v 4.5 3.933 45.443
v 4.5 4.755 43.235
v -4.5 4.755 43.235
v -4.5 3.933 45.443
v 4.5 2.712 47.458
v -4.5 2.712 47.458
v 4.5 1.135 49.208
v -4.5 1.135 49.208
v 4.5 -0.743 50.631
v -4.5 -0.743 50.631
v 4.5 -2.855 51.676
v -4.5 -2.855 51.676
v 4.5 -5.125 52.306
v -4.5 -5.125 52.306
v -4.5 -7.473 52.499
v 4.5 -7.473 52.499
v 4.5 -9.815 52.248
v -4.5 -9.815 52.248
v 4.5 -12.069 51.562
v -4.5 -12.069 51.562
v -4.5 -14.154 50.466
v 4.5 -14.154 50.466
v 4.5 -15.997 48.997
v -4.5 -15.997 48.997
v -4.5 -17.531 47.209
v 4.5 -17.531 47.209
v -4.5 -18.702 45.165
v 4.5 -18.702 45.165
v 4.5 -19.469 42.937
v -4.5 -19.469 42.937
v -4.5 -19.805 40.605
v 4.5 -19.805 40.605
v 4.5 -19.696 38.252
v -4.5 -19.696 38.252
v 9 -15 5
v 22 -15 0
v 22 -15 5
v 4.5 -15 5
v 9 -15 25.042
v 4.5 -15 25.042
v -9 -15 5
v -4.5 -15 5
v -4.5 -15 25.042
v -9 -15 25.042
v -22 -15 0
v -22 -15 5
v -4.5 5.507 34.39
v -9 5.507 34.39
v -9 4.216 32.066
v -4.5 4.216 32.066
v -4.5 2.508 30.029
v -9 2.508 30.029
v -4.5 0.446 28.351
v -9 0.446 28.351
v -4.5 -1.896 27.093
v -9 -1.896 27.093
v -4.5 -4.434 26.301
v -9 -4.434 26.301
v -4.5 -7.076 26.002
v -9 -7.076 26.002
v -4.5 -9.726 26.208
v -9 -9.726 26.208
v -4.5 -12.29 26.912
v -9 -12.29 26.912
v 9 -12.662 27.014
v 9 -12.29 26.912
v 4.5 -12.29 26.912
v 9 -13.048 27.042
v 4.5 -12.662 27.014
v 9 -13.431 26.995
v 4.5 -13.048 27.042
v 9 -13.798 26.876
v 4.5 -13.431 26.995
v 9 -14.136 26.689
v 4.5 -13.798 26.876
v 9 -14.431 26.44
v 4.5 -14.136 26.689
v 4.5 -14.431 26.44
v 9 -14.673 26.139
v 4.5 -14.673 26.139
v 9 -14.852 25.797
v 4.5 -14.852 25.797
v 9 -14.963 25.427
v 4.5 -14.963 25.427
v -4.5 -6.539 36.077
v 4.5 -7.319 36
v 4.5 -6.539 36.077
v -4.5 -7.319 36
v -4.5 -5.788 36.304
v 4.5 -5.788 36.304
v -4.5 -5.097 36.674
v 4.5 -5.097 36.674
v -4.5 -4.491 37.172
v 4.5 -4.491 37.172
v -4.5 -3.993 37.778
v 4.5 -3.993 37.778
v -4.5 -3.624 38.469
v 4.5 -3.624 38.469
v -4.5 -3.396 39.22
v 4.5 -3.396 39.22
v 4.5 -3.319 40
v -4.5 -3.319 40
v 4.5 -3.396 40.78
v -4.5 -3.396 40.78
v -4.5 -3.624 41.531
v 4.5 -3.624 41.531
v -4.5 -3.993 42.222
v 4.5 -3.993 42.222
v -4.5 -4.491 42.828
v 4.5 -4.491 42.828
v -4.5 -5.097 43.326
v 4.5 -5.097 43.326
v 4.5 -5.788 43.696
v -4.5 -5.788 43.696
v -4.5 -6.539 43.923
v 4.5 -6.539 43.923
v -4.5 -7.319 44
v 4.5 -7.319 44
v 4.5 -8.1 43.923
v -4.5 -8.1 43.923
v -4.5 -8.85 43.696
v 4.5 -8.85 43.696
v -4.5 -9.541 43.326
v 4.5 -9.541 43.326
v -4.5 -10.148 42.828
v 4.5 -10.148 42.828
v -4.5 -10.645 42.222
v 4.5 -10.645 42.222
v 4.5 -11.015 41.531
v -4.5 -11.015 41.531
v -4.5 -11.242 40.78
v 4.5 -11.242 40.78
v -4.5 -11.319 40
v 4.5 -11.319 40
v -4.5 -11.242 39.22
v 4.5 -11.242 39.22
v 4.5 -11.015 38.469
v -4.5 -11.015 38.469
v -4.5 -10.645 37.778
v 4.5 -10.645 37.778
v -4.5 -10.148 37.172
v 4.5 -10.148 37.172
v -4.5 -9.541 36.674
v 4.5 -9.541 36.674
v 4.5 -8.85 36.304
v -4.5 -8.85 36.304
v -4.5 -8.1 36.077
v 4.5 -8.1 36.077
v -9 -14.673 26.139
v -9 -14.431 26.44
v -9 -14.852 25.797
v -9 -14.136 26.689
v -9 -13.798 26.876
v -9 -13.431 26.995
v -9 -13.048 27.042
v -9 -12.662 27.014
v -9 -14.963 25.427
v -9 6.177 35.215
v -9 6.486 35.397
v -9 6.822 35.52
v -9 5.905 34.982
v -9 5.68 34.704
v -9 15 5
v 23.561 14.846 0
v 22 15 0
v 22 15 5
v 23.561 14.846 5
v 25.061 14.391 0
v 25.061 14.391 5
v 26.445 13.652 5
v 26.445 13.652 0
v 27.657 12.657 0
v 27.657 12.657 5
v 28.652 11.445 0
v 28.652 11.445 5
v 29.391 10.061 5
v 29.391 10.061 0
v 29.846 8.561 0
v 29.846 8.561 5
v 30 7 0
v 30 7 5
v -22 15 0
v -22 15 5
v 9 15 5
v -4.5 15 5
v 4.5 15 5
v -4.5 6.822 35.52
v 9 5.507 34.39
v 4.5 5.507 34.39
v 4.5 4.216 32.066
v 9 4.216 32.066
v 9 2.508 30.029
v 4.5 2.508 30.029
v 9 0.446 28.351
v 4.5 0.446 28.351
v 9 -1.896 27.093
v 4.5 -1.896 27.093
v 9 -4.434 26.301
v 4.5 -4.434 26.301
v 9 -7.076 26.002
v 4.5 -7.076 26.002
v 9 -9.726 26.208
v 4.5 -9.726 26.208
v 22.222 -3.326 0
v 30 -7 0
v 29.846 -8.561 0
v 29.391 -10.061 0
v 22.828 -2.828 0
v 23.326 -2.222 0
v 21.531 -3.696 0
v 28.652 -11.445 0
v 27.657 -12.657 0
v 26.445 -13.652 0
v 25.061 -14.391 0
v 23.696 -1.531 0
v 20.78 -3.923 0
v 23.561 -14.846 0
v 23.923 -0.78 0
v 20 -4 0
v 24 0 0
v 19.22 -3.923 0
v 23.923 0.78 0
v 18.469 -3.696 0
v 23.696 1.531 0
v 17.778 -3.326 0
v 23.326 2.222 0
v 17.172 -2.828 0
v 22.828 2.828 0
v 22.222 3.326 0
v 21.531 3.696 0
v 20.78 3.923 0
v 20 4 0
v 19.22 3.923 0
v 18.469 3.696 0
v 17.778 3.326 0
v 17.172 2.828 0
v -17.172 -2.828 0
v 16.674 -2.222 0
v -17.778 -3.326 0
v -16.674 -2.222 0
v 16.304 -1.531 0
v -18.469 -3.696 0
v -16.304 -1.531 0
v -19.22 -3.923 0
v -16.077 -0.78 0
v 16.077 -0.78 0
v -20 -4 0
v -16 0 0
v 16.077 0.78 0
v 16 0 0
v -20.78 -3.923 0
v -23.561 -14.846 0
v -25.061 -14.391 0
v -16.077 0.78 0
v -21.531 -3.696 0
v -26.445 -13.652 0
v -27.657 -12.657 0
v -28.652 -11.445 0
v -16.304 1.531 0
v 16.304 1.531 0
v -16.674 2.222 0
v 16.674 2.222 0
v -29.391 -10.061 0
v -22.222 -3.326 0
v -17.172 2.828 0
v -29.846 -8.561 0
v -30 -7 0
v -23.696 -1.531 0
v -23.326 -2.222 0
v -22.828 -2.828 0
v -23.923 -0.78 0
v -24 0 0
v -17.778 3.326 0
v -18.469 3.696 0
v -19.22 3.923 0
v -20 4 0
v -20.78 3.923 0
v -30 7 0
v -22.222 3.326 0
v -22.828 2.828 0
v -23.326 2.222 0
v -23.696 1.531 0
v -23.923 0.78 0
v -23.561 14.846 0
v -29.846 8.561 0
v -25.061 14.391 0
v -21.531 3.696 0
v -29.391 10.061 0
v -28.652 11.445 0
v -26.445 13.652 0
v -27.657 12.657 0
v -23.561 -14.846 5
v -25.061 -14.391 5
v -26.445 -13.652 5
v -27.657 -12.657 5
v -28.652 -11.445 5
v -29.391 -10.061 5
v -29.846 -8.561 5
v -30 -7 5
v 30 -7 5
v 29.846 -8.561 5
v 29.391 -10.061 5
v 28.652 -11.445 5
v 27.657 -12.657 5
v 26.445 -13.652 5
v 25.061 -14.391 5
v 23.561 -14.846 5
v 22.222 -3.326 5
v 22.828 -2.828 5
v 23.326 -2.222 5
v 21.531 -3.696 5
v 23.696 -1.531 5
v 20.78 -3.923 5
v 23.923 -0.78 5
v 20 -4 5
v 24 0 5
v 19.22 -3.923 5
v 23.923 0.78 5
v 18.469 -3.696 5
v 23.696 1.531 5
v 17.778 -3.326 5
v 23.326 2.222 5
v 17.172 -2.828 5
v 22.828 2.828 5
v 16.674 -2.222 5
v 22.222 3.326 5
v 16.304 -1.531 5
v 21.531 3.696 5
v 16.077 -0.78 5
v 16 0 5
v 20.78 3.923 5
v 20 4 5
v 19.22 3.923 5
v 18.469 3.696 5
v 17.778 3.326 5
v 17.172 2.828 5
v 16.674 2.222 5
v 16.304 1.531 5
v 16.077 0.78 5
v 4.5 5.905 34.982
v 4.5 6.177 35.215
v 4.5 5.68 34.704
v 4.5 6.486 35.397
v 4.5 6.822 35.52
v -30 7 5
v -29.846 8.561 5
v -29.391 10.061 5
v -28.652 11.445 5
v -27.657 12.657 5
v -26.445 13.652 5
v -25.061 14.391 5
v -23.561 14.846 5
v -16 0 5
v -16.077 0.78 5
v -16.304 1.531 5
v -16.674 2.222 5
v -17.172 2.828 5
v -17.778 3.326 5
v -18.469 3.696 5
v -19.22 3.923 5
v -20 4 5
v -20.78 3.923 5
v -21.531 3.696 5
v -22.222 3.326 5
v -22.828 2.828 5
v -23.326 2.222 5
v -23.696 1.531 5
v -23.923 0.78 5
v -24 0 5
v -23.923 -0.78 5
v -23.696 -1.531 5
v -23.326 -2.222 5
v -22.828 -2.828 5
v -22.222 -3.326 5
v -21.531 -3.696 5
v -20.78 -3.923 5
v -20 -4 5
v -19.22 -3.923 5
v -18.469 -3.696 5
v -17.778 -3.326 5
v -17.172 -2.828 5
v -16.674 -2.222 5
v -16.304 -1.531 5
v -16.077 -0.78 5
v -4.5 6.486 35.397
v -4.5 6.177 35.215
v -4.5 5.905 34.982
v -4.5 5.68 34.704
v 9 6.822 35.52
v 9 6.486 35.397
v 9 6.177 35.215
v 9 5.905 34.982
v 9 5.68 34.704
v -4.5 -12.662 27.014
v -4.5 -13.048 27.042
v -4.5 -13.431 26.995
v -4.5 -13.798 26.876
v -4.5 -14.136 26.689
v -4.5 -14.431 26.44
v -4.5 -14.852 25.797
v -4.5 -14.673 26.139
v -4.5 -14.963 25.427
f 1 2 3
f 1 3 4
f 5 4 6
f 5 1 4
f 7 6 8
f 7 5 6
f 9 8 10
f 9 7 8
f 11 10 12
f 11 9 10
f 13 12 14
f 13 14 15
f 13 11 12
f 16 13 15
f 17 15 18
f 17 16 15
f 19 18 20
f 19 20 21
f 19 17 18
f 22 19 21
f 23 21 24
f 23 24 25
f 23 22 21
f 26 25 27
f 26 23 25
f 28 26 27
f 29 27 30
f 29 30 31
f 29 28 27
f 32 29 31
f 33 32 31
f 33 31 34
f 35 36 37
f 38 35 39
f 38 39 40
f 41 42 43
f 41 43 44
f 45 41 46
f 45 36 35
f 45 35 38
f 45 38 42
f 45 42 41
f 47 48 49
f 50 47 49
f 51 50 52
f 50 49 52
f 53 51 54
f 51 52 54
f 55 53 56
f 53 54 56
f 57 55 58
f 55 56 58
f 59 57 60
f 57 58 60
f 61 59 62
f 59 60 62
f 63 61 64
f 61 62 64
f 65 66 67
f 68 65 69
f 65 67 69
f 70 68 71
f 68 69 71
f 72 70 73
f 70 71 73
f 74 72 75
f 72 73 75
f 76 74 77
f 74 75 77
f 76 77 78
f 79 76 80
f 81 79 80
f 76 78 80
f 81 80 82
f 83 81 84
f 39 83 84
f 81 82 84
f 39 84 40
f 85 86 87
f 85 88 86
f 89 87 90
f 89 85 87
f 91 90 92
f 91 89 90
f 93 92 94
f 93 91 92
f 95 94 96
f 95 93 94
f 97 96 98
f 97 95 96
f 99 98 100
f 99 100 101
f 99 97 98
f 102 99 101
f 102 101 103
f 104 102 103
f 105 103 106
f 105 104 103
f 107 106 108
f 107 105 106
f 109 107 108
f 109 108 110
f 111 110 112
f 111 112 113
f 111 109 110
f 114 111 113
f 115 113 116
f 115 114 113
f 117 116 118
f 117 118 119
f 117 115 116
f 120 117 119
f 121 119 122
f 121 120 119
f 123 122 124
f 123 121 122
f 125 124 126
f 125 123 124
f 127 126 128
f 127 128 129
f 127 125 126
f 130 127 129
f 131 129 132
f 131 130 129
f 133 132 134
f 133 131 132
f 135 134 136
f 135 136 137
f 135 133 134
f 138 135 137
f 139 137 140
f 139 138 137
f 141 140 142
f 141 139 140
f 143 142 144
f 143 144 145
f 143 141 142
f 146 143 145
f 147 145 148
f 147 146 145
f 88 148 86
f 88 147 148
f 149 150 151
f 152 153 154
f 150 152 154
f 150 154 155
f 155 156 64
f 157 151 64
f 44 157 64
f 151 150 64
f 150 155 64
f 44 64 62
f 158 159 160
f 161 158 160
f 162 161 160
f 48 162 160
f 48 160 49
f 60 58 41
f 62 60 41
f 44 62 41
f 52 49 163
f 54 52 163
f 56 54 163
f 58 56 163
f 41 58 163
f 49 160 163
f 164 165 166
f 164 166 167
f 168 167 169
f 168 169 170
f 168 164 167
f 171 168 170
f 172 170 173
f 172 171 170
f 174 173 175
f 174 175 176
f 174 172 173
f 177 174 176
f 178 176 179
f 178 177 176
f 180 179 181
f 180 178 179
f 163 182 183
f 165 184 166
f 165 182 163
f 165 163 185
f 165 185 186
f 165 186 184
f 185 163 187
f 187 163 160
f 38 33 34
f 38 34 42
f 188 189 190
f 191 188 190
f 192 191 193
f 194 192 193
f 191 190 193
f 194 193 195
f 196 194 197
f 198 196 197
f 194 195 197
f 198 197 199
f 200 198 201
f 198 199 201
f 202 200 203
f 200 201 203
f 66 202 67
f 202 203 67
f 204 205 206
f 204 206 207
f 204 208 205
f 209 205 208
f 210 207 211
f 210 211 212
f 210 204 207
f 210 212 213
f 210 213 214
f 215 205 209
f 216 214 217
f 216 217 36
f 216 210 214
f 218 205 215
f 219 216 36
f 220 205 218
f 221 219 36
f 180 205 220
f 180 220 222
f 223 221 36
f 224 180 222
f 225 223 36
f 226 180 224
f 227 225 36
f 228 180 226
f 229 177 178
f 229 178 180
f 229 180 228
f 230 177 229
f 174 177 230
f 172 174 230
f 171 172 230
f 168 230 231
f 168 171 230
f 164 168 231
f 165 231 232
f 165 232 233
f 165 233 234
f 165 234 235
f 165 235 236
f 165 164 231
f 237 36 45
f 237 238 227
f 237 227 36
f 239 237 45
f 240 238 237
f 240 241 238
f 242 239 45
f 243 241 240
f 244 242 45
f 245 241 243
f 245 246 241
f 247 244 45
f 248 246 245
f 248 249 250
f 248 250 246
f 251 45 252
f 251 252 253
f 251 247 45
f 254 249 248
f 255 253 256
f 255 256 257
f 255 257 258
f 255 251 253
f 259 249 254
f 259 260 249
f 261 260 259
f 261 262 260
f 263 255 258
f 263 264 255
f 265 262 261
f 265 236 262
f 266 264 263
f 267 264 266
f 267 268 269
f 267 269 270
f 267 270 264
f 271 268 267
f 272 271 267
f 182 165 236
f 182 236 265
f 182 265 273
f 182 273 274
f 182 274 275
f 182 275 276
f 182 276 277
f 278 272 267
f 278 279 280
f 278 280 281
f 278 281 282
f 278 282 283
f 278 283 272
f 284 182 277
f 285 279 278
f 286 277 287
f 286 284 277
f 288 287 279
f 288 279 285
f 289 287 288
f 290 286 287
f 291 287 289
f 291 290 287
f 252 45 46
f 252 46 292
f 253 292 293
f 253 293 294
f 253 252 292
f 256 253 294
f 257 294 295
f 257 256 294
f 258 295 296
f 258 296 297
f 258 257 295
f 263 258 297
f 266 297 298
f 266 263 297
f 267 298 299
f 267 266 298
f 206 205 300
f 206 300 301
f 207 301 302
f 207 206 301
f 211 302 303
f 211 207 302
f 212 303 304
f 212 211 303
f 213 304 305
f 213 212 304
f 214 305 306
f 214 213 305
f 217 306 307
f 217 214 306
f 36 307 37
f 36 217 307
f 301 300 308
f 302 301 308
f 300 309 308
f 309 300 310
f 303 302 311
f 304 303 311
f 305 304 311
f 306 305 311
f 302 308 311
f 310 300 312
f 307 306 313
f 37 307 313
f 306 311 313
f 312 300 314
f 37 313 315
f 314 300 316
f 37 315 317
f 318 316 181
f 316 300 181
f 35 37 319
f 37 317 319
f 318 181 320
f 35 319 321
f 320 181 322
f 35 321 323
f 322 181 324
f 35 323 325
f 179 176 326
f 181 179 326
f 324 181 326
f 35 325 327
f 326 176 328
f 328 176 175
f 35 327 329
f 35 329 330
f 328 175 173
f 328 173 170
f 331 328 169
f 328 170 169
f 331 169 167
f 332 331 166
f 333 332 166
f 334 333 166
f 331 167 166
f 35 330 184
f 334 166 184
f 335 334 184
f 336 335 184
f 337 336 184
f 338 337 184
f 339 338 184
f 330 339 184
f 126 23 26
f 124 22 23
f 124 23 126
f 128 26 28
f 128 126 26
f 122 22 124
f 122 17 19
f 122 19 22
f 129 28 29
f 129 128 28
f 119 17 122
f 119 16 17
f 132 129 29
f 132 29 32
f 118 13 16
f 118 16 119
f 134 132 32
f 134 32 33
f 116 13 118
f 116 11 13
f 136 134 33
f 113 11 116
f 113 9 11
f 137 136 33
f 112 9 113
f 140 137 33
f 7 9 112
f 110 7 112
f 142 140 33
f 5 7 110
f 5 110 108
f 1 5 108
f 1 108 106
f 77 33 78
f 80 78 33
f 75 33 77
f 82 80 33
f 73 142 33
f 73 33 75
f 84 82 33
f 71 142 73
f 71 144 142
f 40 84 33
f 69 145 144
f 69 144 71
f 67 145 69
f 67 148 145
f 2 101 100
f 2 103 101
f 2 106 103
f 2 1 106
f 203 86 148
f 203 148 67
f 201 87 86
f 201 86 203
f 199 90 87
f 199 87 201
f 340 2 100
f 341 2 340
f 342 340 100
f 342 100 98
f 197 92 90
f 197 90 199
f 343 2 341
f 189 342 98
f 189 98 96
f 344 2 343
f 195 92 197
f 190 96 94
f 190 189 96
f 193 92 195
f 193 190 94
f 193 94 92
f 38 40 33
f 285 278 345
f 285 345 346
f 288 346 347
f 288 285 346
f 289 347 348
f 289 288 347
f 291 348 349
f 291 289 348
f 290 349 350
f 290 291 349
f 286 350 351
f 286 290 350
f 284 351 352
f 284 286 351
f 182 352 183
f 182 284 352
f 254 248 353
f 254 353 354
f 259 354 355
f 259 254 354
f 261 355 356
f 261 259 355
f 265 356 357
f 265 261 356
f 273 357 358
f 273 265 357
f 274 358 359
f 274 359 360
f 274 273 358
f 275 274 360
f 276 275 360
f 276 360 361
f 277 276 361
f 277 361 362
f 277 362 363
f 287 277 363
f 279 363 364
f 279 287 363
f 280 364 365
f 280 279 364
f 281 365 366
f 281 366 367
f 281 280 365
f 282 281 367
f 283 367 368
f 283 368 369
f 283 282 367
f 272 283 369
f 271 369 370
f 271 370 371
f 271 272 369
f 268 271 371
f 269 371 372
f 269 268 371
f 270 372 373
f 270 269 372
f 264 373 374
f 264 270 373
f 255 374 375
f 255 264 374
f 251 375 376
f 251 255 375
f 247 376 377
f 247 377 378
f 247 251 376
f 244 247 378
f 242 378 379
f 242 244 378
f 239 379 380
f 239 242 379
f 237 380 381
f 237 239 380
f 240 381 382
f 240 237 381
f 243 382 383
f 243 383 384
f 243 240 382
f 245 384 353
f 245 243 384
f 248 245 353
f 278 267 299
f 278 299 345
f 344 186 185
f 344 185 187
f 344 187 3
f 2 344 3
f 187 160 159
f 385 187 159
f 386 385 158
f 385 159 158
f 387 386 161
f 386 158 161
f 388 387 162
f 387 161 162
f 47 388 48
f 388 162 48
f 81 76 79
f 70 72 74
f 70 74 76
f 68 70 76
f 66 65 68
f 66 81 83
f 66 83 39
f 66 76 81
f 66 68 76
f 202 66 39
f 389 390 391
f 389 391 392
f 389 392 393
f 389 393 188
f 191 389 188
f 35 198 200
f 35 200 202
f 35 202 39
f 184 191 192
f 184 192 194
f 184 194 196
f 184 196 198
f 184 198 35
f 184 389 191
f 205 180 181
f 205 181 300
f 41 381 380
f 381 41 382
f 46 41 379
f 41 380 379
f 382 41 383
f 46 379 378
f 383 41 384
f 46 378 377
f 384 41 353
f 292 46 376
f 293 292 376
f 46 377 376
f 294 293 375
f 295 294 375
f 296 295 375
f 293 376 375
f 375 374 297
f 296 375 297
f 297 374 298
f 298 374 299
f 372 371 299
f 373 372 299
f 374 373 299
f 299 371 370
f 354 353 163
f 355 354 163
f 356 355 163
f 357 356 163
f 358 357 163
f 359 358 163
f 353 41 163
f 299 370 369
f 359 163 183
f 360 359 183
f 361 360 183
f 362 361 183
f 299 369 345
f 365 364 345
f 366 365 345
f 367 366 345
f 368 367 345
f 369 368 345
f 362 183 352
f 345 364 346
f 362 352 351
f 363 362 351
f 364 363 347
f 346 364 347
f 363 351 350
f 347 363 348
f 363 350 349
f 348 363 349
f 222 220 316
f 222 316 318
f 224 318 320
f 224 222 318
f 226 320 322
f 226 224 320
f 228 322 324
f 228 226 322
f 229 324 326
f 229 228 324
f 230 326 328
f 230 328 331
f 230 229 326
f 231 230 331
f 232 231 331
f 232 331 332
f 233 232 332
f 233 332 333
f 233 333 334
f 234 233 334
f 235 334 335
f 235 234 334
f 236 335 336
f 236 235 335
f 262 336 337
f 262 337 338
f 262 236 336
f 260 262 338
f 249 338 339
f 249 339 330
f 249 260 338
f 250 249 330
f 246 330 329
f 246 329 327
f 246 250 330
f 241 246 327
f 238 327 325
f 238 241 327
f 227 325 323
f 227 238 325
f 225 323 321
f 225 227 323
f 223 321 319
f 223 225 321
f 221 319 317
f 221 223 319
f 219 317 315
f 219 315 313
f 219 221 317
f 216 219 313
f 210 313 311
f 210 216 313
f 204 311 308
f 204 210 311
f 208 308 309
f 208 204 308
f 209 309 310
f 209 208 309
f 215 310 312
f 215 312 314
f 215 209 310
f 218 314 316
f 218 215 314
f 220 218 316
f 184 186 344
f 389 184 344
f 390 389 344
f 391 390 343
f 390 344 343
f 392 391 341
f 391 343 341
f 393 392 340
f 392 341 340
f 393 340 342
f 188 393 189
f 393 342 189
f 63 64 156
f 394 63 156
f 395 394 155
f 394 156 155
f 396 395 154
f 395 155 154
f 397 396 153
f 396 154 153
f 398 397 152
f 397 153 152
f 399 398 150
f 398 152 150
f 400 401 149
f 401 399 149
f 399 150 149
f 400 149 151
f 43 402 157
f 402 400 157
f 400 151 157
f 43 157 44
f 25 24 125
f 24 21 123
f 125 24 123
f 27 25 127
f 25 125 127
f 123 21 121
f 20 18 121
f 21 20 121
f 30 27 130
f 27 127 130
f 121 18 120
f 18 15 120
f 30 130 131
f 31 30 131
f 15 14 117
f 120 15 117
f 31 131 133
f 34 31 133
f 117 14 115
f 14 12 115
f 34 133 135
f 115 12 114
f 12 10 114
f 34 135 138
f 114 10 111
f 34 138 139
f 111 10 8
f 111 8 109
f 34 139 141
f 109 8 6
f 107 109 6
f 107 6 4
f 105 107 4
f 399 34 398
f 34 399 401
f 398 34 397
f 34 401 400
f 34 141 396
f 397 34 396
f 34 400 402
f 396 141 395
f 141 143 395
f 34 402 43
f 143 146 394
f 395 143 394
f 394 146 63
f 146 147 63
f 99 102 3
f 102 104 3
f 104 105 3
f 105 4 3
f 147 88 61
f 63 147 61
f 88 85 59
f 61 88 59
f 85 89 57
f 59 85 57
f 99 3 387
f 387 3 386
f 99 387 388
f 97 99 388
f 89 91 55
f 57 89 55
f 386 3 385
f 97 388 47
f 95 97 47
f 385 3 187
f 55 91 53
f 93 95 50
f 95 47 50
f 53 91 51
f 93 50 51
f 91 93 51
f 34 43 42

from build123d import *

# Parameters (mm, degrees)
SZKIC1_R                         = 4
DODANIE_WYCI_GNI_CIE1_DEPTH      = 5
SZKIC7_R                         = 4
DODANIE_WYCI_GNI_CIE3_DEPTH      = 4.5
DODANIE_WYCI_GNI_CIE5_DEPTH      = 4.5
DODANIE_WYCI_GNI_CIE5_DEPTH_BACK = 13.5


with BuildPart() as part:
    # Szkic1 → Dodanie-wyciągnięcie1 (new body)
    with BuildSketch(Plane.XY):
        with BuildLine():
            Line((-22, 15), (22, 15))
            ThreePointArc((22, 15), (27.656854249, 12.656854249), (30, 7))
            Line((30, 7), (30, -7))
            ThreePointArc((30, -7), (27.656854249, -12.656854249), (22, -15))
            Line((22, -15), (-22, -15))
            ThreePointArc((-22, -15), (-27.656854249, -12.656854249), (-30, -7))
            Line((-30, -7), (-30, 7))
            ThreePointArc((-30, 7), (-27.656854249, 12.656854249), (-22, 15))
        make_face()
        with Locations((-20, 0)):
            Circle(SZKIC1_R, mode=Mode.SUBTRACT)
        with Locations((20, 0)):
            Circle(SZKIC1_R, mode=Mode.SUBTRACT)
    extrude(amount=DODANIE_WYCI_GNI_CIE1_DEPTH)

    # Szkic7 → Dodanie-wyciągnięcie3 (add, symmetric)
    with BuildSketch(Plane(origin=(0, 0, 0), x_dir=(0, 0, -1), z_dir=(1, 0, 0))):
        with BuildLine():
            Line((-5, 15), (-43.235238064, 4.754898838))
            ThreePointArc((-43.235238064, 4.754898838), (-52.248209815, -9.815442471), (-38.251909732, -19.696337656))
            Line((-38.251909732, -19.696337656), (-5, -15))
            Line((-5, -15), (-5, 15))
        make_face()
        with Locations((-40, -7.31917399)):
            Circle(SZKIC7_R, mode=Mode.SUBTRACT)
    extrude(amount=DODANIE_WYCI_GNI_CIE3_DEPTH, both=True)

    # Szkic8 → Dodanie-wyciągnięcie5 (add, two sides: drawn at the far end of the back side and taken through both)
    with BuildSketch(Plane(origin=(4.5, 0, 0), x_dir=(0, 0, -1), z_dir=(1, 0, 0)).offset(-DODANIE_WYCI_GNI_CIE5_DEPTH_BACK)):
        with BuildLine():
            Line((-5, -15), (-5, 15))
            Line((-5, 15), (-35.519913082, 6.822213937))
            ThreePointArc((-35.519913082, 6.822213937), (-35.104612696, 6.035983837), (-34.389553751, 5.507473775))
            ThreePointArc((-34.389553751, 5.507473775), (-27.092900988, -1.896370741), (-26.91214627, -12.289896749))
            ThreePointArc((-26.91214627, -12.289896749), (-26.688692003, -14.135736214), (-25.04245288, -15))
            Line((-25.04245288, -15), (-5, -15))
        make_face()
    extrude(amount=DODANIE_WYCI_GNI_CIE5_DEPTH + DODANIE_WYCI_GNI_CIE5_DEPTH_BACK)


solid = part.part
